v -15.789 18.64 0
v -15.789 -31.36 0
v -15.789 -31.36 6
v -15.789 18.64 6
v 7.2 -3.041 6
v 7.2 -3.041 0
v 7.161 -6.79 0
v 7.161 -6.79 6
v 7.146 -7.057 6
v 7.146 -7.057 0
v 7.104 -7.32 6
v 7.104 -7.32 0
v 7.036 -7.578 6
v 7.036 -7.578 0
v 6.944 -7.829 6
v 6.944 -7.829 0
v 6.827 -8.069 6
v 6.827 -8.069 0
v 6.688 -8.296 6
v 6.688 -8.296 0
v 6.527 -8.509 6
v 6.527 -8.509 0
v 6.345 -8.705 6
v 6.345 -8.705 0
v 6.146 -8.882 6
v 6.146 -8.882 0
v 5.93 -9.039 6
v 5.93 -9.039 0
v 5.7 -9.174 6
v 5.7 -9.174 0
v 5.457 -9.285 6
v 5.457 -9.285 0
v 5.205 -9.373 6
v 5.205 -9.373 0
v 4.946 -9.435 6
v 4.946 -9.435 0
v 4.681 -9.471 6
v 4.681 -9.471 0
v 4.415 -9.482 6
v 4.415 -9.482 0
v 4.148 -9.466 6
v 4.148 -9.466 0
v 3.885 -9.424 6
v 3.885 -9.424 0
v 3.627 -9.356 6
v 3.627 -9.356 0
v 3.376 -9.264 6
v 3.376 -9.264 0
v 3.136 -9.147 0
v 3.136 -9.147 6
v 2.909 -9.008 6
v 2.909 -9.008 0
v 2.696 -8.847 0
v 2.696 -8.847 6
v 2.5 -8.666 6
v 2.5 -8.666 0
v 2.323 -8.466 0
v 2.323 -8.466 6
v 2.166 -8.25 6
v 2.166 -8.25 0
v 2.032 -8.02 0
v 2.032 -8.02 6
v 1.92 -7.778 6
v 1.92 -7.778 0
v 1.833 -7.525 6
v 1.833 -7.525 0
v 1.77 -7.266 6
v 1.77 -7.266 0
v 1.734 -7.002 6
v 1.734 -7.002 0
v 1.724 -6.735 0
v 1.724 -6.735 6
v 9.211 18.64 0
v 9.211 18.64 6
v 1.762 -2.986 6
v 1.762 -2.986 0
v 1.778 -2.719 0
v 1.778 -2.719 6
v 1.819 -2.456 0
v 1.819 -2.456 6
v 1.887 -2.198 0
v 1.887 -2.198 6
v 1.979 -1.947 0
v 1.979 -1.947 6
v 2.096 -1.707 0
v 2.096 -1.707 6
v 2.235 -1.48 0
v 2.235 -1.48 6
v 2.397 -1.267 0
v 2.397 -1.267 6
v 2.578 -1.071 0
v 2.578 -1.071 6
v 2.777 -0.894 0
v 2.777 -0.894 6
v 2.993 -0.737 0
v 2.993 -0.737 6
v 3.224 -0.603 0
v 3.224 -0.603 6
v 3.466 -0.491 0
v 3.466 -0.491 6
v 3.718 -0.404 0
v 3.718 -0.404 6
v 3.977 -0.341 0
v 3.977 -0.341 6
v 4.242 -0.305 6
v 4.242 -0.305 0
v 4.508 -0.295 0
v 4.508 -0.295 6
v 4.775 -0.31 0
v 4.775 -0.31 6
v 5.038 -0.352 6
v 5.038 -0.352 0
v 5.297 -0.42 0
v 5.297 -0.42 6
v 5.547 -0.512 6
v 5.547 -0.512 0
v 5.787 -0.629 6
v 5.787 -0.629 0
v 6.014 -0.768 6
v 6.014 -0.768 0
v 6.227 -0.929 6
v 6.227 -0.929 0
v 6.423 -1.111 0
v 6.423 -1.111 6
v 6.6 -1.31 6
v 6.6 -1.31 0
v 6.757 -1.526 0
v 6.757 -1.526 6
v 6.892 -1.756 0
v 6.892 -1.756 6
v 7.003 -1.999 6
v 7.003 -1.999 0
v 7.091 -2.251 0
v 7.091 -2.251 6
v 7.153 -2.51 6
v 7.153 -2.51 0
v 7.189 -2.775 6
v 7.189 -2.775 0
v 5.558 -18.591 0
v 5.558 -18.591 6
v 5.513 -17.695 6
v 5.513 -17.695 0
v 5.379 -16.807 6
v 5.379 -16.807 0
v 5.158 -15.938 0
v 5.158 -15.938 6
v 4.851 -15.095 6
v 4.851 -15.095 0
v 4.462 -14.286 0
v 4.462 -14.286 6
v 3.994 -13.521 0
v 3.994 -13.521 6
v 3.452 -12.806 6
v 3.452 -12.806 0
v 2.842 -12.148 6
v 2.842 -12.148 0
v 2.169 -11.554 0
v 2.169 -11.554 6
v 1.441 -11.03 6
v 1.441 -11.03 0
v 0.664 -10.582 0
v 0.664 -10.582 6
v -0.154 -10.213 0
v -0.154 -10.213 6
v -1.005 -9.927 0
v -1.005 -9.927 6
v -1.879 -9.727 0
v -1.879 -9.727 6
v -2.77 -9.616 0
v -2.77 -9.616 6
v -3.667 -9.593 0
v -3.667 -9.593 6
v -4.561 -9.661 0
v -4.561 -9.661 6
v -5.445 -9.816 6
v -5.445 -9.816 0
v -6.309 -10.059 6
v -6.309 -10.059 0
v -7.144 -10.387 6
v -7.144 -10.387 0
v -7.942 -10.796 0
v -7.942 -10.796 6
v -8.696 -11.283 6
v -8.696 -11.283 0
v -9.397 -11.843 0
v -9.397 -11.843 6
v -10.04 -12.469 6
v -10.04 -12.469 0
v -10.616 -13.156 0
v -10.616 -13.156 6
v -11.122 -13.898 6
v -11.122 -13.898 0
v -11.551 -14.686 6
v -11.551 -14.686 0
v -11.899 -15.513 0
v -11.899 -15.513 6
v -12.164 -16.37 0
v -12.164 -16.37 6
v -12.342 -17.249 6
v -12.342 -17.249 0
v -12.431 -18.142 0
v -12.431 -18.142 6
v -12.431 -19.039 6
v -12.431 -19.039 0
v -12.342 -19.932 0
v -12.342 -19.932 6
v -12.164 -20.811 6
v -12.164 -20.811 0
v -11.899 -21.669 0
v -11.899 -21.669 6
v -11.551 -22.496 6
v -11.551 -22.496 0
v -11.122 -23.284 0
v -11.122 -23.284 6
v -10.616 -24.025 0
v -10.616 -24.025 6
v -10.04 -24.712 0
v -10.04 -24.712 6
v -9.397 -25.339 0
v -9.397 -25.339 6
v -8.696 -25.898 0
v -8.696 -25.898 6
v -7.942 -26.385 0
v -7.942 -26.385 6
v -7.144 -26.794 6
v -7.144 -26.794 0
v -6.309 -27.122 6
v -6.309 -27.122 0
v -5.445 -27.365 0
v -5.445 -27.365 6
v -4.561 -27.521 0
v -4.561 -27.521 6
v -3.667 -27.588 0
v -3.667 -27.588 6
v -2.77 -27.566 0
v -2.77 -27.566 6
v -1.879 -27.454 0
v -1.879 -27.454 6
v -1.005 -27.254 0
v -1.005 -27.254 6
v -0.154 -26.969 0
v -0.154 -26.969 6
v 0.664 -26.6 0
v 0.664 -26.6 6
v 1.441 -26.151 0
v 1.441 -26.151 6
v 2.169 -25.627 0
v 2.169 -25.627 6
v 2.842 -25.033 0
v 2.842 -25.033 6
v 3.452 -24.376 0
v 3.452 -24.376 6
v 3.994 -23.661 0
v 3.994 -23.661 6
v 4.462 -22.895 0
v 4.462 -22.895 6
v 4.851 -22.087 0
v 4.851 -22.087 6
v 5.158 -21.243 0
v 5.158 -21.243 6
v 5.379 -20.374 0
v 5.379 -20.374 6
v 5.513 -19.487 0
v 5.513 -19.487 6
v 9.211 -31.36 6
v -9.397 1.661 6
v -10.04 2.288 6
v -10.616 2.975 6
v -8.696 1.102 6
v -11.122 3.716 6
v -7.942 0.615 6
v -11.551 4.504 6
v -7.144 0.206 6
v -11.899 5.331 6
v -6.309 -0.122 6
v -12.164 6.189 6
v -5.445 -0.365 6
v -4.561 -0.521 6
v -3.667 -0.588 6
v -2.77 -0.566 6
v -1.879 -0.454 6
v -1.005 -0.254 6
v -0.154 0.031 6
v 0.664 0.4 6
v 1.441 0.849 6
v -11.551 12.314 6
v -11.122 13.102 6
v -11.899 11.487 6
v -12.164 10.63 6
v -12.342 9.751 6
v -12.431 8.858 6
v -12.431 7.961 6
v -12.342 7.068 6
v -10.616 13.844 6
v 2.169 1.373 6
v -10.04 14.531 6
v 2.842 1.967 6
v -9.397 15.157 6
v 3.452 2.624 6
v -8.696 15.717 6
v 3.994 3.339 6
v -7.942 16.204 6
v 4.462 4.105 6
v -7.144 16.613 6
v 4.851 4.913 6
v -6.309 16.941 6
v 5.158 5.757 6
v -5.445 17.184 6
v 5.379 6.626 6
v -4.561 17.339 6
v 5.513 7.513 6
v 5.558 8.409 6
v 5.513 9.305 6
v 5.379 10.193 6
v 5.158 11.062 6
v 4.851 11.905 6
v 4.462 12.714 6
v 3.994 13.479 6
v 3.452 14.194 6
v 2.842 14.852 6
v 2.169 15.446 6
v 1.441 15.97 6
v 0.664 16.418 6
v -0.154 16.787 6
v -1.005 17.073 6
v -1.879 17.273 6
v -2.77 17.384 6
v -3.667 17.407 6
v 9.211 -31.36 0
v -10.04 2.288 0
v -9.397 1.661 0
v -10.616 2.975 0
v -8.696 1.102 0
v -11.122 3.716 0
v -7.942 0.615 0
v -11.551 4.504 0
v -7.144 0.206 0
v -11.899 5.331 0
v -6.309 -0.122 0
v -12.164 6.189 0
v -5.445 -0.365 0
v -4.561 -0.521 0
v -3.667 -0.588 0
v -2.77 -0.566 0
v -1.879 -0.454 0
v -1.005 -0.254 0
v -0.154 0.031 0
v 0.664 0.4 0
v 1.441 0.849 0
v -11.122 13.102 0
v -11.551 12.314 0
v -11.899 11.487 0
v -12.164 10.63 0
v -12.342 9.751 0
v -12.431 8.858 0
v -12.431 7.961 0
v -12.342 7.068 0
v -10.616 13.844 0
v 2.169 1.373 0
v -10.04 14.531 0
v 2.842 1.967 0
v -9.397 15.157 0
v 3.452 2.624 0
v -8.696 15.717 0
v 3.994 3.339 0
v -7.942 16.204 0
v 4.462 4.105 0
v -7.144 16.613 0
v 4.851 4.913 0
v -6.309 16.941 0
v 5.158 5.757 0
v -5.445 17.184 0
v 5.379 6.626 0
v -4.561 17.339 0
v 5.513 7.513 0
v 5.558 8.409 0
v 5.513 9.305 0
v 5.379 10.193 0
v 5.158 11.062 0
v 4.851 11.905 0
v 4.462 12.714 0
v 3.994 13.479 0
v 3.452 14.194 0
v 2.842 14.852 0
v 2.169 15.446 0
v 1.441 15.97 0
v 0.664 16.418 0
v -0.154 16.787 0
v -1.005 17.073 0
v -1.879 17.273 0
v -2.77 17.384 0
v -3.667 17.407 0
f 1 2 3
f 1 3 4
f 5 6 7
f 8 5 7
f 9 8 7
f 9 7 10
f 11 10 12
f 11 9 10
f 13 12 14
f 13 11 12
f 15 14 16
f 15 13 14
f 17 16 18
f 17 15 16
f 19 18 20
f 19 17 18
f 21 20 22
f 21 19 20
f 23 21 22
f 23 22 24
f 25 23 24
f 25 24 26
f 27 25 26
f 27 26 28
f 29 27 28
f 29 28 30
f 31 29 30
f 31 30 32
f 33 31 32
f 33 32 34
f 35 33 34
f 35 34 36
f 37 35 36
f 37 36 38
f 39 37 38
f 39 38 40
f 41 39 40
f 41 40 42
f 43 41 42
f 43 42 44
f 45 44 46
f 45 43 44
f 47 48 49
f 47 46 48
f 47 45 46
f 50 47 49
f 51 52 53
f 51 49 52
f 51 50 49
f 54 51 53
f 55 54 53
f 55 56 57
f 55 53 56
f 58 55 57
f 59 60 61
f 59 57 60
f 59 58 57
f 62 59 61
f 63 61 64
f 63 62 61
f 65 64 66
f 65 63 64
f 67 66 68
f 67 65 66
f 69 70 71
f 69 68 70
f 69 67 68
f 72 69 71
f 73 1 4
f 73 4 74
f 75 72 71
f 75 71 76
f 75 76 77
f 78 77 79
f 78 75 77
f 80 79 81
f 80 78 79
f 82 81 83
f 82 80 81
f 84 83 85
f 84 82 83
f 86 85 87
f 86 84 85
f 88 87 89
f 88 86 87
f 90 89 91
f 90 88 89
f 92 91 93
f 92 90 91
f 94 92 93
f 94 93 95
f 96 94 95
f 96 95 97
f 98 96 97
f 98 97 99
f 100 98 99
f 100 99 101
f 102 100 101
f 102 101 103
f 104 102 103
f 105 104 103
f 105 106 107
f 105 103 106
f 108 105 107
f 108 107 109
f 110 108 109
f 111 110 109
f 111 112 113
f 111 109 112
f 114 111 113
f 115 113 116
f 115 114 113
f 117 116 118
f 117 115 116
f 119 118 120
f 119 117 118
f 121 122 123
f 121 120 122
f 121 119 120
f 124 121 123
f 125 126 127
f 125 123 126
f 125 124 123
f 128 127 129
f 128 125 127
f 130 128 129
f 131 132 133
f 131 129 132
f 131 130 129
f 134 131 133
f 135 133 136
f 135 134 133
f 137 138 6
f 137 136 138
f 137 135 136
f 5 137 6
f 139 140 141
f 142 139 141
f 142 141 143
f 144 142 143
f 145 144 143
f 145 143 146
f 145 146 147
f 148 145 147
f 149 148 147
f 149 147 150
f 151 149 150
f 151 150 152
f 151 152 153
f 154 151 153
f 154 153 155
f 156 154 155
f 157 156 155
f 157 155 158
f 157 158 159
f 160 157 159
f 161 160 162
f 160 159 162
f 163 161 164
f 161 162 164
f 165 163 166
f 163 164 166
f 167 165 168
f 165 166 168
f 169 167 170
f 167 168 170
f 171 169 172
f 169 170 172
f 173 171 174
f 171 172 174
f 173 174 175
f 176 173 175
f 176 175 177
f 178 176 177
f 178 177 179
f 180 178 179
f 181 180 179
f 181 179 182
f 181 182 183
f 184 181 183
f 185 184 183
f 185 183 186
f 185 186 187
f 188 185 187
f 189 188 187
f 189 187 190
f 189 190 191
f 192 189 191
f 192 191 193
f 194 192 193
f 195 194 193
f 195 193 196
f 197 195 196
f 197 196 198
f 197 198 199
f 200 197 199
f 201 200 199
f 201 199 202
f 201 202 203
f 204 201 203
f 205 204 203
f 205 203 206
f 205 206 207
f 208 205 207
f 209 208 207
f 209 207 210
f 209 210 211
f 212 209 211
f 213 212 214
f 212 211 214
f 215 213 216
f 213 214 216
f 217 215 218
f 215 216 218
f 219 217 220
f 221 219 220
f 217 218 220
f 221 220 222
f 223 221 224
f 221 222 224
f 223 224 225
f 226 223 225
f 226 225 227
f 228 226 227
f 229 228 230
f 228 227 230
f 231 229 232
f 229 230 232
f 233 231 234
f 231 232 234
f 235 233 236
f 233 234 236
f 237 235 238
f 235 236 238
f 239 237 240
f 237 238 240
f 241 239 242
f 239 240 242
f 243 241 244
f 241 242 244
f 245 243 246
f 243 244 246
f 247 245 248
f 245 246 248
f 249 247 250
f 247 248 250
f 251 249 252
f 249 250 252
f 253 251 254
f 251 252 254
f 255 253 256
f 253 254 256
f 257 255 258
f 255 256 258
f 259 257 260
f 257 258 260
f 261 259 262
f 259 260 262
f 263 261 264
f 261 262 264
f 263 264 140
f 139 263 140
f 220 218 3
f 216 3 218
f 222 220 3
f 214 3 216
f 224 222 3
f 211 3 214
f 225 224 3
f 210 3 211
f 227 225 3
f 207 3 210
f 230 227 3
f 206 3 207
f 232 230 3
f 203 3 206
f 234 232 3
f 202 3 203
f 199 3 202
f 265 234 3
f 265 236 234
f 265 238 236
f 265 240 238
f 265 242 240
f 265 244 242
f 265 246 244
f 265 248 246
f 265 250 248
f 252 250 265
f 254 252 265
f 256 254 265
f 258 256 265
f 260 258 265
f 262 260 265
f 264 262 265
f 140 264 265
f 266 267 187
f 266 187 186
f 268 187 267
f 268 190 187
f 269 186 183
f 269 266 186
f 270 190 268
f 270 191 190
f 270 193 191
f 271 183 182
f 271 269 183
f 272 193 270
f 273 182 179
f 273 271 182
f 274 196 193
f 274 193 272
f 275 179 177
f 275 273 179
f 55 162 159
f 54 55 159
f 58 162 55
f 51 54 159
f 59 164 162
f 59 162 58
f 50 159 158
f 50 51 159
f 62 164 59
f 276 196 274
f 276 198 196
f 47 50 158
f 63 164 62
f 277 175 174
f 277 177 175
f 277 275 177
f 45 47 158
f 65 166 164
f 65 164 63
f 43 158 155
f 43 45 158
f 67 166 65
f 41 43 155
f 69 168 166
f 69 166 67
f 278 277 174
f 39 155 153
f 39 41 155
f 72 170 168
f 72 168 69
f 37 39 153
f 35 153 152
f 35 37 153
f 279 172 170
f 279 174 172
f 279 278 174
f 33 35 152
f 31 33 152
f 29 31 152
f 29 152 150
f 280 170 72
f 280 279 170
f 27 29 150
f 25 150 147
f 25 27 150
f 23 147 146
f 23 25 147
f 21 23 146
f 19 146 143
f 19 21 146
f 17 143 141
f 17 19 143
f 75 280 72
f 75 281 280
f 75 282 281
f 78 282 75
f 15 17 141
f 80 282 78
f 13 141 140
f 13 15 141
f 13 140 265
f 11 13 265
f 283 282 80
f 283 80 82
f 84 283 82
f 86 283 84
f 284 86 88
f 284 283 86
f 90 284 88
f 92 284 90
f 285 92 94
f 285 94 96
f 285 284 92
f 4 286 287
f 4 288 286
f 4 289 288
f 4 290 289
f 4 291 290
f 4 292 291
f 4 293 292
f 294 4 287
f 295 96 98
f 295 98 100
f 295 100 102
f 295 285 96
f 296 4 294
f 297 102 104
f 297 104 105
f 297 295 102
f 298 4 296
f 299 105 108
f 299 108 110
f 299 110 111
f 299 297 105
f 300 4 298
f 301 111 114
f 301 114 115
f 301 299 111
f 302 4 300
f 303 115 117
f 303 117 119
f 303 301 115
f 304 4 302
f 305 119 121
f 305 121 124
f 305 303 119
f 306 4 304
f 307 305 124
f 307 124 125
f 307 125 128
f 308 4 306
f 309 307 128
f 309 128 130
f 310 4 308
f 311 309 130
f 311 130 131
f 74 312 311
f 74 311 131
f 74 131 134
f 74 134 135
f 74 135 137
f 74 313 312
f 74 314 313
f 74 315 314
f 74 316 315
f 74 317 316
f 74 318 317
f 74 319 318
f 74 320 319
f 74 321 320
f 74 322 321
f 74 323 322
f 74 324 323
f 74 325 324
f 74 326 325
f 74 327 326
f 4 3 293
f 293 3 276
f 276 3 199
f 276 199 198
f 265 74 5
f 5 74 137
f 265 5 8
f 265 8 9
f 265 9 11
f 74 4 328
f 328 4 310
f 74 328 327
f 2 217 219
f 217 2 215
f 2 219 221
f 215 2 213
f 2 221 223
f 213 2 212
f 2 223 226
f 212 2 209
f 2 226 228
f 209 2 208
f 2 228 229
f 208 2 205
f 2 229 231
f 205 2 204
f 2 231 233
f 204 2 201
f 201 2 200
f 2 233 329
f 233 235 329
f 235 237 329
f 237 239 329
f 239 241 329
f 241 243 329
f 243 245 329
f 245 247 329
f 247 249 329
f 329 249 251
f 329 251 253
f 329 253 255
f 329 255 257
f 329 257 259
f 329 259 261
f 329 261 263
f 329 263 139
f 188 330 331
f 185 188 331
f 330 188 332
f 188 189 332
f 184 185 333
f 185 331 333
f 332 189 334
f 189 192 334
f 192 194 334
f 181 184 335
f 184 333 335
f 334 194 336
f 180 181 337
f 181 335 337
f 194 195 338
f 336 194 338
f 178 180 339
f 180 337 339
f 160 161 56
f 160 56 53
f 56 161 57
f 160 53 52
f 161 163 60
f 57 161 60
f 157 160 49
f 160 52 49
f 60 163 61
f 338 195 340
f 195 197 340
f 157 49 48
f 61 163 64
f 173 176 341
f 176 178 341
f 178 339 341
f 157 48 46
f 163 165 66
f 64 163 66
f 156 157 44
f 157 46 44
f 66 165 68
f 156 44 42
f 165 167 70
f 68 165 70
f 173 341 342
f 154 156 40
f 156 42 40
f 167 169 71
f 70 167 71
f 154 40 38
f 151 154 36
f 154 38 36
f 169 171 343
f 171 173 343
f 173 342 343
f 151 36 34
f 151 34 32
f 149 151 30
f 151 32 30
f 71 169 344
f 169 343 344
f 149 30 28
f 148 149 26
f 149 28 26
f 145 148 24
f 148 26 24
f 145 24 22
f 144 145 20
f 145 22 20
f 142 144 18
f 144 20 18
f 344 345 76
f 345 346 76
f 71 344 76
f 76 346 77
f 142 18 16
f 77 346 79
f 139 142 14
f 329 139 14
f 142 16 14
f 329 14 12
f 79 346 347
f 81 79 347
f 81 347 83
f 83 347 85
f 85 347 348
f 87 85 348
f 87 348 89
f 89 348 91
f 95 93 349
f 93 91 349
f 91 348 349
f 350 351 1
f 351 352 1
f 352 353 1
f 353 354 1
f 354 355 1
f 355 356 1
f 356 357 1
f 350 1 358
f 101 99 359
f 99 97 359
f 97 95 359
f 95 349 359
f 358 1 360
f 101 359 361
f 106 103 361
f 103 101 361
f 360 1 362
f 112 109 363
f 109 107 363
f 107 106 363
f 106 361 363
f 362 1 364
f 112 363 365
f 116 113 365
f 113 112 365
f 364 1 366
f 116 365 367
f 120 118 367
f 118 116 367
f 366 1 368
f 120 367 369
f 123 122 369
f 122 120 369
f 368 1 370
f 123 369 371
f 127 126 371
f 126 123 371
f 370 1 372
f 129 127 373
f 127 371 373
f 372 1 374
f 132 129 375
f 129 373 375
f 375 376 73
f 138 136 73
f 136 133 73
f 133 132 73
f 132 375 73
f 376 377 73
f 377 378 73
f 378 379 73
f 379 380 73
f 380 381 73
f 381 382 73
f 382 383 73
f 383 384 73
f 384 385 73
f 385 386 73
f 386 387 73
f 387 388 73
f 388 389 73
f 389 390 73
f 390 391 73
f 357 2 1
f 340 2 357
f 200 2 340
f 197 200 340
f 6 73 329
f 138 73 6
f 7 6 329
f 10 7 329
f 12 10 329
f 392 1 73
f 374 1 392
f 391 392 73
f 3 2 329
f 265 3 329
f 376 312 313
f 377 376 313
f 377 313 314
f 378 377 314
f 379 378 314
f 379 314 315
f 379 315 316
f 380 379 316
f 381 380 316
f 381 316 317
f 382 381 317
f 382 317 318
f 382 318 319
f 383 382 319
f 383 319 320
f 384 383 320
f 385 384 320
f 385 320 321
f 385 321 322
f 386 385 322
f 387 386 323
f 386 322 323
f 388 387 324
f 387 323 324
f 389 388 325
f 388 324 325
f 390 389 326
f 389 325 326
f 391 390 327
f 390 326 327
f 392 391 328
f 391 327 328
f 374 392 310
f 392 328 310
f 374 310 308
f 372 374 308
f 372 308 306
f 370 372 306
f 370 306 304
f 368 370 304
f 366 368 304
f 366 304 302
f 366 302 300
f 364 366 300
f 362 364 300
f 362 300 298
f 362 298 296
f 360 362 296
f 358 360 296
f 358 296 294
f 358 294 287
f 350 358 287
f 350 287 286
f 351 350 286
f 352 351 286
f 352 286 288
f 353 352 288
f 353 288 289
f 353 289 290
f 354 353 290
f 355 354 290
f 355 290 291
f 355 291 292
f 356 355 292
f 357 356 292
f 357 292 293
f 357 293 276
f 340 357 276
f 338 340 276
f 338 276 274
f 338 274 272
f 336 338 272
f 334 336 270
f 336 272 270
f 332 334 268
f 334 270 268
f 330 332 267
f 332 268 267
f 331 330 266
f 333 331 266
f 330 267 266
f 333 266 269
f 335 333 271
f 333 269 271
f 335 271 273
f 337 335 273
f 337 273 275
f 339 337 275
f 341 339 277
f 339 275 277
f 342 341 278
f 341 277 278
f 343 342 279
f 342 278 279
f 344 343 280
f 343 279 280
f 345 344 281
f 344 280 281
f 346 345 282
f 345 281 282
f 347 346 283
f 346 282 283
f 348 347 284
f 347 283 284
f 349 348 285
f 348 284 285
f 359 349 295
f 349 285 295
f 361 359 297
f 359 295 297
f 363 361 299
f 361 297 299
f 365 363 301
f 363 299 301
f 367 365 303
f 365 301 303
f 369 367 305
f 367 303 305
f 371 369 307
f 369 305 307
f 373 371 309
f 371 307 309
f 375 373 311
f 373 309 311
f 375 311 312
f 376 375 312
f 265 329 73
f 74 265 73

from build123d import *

# Parameters (mm, degrees)
SKETCH1_W           = 25
SKETCH1_H           = 50
BOSS_EXTRUDE1_DEPTH = 6
SKETCH2_R           = 9
CUT_EXTRUDE1_DEPTH  = 36.619307578


with BuildPart() as part:
    # Sketch1 → Boss-Extrude1 (new body)
    with BuildSketch(Plane.XY):
        with Locations((-3.289473684, -6.359649123)):
            Rectangle(SKETCH1_W, SKETCH1_H)
    extrude(amount=BOSS_EXTRUDE1_DEPTH)

    # Sketch2 → Cut-Extrude1 (cut, through all)
    with BuildSketch(Plane.XY.offset(6)):
        with Locations((-3.442256095, 8.409317212)):
            Circle(SKETCH2_R)
        with Locations((-3.442256095, -18.590682788)):
            Circle(SKETCH2_R)
        with BuildLine():
            Line((7.19958983, -3.041196046), (7.161332442, -6.790420083))
            ThreePointArc((7.161332442, -6.790420083), (4.414711412, -9.481553819), (1.723577676, -6.734932789))
            Line((1.723577676, -6.734932789), (1.761835064, -2.985708753))
            ThreePointArc((1.761835064, -2.985708753), (4.508456094, -0.294575016), (7.19958983, -3.041196046))
        make_face()
    extrude(amount=-CUT_EXTRUDE1_DEPTH, mode=Mode.SUBTRACT)


solid = part.part
